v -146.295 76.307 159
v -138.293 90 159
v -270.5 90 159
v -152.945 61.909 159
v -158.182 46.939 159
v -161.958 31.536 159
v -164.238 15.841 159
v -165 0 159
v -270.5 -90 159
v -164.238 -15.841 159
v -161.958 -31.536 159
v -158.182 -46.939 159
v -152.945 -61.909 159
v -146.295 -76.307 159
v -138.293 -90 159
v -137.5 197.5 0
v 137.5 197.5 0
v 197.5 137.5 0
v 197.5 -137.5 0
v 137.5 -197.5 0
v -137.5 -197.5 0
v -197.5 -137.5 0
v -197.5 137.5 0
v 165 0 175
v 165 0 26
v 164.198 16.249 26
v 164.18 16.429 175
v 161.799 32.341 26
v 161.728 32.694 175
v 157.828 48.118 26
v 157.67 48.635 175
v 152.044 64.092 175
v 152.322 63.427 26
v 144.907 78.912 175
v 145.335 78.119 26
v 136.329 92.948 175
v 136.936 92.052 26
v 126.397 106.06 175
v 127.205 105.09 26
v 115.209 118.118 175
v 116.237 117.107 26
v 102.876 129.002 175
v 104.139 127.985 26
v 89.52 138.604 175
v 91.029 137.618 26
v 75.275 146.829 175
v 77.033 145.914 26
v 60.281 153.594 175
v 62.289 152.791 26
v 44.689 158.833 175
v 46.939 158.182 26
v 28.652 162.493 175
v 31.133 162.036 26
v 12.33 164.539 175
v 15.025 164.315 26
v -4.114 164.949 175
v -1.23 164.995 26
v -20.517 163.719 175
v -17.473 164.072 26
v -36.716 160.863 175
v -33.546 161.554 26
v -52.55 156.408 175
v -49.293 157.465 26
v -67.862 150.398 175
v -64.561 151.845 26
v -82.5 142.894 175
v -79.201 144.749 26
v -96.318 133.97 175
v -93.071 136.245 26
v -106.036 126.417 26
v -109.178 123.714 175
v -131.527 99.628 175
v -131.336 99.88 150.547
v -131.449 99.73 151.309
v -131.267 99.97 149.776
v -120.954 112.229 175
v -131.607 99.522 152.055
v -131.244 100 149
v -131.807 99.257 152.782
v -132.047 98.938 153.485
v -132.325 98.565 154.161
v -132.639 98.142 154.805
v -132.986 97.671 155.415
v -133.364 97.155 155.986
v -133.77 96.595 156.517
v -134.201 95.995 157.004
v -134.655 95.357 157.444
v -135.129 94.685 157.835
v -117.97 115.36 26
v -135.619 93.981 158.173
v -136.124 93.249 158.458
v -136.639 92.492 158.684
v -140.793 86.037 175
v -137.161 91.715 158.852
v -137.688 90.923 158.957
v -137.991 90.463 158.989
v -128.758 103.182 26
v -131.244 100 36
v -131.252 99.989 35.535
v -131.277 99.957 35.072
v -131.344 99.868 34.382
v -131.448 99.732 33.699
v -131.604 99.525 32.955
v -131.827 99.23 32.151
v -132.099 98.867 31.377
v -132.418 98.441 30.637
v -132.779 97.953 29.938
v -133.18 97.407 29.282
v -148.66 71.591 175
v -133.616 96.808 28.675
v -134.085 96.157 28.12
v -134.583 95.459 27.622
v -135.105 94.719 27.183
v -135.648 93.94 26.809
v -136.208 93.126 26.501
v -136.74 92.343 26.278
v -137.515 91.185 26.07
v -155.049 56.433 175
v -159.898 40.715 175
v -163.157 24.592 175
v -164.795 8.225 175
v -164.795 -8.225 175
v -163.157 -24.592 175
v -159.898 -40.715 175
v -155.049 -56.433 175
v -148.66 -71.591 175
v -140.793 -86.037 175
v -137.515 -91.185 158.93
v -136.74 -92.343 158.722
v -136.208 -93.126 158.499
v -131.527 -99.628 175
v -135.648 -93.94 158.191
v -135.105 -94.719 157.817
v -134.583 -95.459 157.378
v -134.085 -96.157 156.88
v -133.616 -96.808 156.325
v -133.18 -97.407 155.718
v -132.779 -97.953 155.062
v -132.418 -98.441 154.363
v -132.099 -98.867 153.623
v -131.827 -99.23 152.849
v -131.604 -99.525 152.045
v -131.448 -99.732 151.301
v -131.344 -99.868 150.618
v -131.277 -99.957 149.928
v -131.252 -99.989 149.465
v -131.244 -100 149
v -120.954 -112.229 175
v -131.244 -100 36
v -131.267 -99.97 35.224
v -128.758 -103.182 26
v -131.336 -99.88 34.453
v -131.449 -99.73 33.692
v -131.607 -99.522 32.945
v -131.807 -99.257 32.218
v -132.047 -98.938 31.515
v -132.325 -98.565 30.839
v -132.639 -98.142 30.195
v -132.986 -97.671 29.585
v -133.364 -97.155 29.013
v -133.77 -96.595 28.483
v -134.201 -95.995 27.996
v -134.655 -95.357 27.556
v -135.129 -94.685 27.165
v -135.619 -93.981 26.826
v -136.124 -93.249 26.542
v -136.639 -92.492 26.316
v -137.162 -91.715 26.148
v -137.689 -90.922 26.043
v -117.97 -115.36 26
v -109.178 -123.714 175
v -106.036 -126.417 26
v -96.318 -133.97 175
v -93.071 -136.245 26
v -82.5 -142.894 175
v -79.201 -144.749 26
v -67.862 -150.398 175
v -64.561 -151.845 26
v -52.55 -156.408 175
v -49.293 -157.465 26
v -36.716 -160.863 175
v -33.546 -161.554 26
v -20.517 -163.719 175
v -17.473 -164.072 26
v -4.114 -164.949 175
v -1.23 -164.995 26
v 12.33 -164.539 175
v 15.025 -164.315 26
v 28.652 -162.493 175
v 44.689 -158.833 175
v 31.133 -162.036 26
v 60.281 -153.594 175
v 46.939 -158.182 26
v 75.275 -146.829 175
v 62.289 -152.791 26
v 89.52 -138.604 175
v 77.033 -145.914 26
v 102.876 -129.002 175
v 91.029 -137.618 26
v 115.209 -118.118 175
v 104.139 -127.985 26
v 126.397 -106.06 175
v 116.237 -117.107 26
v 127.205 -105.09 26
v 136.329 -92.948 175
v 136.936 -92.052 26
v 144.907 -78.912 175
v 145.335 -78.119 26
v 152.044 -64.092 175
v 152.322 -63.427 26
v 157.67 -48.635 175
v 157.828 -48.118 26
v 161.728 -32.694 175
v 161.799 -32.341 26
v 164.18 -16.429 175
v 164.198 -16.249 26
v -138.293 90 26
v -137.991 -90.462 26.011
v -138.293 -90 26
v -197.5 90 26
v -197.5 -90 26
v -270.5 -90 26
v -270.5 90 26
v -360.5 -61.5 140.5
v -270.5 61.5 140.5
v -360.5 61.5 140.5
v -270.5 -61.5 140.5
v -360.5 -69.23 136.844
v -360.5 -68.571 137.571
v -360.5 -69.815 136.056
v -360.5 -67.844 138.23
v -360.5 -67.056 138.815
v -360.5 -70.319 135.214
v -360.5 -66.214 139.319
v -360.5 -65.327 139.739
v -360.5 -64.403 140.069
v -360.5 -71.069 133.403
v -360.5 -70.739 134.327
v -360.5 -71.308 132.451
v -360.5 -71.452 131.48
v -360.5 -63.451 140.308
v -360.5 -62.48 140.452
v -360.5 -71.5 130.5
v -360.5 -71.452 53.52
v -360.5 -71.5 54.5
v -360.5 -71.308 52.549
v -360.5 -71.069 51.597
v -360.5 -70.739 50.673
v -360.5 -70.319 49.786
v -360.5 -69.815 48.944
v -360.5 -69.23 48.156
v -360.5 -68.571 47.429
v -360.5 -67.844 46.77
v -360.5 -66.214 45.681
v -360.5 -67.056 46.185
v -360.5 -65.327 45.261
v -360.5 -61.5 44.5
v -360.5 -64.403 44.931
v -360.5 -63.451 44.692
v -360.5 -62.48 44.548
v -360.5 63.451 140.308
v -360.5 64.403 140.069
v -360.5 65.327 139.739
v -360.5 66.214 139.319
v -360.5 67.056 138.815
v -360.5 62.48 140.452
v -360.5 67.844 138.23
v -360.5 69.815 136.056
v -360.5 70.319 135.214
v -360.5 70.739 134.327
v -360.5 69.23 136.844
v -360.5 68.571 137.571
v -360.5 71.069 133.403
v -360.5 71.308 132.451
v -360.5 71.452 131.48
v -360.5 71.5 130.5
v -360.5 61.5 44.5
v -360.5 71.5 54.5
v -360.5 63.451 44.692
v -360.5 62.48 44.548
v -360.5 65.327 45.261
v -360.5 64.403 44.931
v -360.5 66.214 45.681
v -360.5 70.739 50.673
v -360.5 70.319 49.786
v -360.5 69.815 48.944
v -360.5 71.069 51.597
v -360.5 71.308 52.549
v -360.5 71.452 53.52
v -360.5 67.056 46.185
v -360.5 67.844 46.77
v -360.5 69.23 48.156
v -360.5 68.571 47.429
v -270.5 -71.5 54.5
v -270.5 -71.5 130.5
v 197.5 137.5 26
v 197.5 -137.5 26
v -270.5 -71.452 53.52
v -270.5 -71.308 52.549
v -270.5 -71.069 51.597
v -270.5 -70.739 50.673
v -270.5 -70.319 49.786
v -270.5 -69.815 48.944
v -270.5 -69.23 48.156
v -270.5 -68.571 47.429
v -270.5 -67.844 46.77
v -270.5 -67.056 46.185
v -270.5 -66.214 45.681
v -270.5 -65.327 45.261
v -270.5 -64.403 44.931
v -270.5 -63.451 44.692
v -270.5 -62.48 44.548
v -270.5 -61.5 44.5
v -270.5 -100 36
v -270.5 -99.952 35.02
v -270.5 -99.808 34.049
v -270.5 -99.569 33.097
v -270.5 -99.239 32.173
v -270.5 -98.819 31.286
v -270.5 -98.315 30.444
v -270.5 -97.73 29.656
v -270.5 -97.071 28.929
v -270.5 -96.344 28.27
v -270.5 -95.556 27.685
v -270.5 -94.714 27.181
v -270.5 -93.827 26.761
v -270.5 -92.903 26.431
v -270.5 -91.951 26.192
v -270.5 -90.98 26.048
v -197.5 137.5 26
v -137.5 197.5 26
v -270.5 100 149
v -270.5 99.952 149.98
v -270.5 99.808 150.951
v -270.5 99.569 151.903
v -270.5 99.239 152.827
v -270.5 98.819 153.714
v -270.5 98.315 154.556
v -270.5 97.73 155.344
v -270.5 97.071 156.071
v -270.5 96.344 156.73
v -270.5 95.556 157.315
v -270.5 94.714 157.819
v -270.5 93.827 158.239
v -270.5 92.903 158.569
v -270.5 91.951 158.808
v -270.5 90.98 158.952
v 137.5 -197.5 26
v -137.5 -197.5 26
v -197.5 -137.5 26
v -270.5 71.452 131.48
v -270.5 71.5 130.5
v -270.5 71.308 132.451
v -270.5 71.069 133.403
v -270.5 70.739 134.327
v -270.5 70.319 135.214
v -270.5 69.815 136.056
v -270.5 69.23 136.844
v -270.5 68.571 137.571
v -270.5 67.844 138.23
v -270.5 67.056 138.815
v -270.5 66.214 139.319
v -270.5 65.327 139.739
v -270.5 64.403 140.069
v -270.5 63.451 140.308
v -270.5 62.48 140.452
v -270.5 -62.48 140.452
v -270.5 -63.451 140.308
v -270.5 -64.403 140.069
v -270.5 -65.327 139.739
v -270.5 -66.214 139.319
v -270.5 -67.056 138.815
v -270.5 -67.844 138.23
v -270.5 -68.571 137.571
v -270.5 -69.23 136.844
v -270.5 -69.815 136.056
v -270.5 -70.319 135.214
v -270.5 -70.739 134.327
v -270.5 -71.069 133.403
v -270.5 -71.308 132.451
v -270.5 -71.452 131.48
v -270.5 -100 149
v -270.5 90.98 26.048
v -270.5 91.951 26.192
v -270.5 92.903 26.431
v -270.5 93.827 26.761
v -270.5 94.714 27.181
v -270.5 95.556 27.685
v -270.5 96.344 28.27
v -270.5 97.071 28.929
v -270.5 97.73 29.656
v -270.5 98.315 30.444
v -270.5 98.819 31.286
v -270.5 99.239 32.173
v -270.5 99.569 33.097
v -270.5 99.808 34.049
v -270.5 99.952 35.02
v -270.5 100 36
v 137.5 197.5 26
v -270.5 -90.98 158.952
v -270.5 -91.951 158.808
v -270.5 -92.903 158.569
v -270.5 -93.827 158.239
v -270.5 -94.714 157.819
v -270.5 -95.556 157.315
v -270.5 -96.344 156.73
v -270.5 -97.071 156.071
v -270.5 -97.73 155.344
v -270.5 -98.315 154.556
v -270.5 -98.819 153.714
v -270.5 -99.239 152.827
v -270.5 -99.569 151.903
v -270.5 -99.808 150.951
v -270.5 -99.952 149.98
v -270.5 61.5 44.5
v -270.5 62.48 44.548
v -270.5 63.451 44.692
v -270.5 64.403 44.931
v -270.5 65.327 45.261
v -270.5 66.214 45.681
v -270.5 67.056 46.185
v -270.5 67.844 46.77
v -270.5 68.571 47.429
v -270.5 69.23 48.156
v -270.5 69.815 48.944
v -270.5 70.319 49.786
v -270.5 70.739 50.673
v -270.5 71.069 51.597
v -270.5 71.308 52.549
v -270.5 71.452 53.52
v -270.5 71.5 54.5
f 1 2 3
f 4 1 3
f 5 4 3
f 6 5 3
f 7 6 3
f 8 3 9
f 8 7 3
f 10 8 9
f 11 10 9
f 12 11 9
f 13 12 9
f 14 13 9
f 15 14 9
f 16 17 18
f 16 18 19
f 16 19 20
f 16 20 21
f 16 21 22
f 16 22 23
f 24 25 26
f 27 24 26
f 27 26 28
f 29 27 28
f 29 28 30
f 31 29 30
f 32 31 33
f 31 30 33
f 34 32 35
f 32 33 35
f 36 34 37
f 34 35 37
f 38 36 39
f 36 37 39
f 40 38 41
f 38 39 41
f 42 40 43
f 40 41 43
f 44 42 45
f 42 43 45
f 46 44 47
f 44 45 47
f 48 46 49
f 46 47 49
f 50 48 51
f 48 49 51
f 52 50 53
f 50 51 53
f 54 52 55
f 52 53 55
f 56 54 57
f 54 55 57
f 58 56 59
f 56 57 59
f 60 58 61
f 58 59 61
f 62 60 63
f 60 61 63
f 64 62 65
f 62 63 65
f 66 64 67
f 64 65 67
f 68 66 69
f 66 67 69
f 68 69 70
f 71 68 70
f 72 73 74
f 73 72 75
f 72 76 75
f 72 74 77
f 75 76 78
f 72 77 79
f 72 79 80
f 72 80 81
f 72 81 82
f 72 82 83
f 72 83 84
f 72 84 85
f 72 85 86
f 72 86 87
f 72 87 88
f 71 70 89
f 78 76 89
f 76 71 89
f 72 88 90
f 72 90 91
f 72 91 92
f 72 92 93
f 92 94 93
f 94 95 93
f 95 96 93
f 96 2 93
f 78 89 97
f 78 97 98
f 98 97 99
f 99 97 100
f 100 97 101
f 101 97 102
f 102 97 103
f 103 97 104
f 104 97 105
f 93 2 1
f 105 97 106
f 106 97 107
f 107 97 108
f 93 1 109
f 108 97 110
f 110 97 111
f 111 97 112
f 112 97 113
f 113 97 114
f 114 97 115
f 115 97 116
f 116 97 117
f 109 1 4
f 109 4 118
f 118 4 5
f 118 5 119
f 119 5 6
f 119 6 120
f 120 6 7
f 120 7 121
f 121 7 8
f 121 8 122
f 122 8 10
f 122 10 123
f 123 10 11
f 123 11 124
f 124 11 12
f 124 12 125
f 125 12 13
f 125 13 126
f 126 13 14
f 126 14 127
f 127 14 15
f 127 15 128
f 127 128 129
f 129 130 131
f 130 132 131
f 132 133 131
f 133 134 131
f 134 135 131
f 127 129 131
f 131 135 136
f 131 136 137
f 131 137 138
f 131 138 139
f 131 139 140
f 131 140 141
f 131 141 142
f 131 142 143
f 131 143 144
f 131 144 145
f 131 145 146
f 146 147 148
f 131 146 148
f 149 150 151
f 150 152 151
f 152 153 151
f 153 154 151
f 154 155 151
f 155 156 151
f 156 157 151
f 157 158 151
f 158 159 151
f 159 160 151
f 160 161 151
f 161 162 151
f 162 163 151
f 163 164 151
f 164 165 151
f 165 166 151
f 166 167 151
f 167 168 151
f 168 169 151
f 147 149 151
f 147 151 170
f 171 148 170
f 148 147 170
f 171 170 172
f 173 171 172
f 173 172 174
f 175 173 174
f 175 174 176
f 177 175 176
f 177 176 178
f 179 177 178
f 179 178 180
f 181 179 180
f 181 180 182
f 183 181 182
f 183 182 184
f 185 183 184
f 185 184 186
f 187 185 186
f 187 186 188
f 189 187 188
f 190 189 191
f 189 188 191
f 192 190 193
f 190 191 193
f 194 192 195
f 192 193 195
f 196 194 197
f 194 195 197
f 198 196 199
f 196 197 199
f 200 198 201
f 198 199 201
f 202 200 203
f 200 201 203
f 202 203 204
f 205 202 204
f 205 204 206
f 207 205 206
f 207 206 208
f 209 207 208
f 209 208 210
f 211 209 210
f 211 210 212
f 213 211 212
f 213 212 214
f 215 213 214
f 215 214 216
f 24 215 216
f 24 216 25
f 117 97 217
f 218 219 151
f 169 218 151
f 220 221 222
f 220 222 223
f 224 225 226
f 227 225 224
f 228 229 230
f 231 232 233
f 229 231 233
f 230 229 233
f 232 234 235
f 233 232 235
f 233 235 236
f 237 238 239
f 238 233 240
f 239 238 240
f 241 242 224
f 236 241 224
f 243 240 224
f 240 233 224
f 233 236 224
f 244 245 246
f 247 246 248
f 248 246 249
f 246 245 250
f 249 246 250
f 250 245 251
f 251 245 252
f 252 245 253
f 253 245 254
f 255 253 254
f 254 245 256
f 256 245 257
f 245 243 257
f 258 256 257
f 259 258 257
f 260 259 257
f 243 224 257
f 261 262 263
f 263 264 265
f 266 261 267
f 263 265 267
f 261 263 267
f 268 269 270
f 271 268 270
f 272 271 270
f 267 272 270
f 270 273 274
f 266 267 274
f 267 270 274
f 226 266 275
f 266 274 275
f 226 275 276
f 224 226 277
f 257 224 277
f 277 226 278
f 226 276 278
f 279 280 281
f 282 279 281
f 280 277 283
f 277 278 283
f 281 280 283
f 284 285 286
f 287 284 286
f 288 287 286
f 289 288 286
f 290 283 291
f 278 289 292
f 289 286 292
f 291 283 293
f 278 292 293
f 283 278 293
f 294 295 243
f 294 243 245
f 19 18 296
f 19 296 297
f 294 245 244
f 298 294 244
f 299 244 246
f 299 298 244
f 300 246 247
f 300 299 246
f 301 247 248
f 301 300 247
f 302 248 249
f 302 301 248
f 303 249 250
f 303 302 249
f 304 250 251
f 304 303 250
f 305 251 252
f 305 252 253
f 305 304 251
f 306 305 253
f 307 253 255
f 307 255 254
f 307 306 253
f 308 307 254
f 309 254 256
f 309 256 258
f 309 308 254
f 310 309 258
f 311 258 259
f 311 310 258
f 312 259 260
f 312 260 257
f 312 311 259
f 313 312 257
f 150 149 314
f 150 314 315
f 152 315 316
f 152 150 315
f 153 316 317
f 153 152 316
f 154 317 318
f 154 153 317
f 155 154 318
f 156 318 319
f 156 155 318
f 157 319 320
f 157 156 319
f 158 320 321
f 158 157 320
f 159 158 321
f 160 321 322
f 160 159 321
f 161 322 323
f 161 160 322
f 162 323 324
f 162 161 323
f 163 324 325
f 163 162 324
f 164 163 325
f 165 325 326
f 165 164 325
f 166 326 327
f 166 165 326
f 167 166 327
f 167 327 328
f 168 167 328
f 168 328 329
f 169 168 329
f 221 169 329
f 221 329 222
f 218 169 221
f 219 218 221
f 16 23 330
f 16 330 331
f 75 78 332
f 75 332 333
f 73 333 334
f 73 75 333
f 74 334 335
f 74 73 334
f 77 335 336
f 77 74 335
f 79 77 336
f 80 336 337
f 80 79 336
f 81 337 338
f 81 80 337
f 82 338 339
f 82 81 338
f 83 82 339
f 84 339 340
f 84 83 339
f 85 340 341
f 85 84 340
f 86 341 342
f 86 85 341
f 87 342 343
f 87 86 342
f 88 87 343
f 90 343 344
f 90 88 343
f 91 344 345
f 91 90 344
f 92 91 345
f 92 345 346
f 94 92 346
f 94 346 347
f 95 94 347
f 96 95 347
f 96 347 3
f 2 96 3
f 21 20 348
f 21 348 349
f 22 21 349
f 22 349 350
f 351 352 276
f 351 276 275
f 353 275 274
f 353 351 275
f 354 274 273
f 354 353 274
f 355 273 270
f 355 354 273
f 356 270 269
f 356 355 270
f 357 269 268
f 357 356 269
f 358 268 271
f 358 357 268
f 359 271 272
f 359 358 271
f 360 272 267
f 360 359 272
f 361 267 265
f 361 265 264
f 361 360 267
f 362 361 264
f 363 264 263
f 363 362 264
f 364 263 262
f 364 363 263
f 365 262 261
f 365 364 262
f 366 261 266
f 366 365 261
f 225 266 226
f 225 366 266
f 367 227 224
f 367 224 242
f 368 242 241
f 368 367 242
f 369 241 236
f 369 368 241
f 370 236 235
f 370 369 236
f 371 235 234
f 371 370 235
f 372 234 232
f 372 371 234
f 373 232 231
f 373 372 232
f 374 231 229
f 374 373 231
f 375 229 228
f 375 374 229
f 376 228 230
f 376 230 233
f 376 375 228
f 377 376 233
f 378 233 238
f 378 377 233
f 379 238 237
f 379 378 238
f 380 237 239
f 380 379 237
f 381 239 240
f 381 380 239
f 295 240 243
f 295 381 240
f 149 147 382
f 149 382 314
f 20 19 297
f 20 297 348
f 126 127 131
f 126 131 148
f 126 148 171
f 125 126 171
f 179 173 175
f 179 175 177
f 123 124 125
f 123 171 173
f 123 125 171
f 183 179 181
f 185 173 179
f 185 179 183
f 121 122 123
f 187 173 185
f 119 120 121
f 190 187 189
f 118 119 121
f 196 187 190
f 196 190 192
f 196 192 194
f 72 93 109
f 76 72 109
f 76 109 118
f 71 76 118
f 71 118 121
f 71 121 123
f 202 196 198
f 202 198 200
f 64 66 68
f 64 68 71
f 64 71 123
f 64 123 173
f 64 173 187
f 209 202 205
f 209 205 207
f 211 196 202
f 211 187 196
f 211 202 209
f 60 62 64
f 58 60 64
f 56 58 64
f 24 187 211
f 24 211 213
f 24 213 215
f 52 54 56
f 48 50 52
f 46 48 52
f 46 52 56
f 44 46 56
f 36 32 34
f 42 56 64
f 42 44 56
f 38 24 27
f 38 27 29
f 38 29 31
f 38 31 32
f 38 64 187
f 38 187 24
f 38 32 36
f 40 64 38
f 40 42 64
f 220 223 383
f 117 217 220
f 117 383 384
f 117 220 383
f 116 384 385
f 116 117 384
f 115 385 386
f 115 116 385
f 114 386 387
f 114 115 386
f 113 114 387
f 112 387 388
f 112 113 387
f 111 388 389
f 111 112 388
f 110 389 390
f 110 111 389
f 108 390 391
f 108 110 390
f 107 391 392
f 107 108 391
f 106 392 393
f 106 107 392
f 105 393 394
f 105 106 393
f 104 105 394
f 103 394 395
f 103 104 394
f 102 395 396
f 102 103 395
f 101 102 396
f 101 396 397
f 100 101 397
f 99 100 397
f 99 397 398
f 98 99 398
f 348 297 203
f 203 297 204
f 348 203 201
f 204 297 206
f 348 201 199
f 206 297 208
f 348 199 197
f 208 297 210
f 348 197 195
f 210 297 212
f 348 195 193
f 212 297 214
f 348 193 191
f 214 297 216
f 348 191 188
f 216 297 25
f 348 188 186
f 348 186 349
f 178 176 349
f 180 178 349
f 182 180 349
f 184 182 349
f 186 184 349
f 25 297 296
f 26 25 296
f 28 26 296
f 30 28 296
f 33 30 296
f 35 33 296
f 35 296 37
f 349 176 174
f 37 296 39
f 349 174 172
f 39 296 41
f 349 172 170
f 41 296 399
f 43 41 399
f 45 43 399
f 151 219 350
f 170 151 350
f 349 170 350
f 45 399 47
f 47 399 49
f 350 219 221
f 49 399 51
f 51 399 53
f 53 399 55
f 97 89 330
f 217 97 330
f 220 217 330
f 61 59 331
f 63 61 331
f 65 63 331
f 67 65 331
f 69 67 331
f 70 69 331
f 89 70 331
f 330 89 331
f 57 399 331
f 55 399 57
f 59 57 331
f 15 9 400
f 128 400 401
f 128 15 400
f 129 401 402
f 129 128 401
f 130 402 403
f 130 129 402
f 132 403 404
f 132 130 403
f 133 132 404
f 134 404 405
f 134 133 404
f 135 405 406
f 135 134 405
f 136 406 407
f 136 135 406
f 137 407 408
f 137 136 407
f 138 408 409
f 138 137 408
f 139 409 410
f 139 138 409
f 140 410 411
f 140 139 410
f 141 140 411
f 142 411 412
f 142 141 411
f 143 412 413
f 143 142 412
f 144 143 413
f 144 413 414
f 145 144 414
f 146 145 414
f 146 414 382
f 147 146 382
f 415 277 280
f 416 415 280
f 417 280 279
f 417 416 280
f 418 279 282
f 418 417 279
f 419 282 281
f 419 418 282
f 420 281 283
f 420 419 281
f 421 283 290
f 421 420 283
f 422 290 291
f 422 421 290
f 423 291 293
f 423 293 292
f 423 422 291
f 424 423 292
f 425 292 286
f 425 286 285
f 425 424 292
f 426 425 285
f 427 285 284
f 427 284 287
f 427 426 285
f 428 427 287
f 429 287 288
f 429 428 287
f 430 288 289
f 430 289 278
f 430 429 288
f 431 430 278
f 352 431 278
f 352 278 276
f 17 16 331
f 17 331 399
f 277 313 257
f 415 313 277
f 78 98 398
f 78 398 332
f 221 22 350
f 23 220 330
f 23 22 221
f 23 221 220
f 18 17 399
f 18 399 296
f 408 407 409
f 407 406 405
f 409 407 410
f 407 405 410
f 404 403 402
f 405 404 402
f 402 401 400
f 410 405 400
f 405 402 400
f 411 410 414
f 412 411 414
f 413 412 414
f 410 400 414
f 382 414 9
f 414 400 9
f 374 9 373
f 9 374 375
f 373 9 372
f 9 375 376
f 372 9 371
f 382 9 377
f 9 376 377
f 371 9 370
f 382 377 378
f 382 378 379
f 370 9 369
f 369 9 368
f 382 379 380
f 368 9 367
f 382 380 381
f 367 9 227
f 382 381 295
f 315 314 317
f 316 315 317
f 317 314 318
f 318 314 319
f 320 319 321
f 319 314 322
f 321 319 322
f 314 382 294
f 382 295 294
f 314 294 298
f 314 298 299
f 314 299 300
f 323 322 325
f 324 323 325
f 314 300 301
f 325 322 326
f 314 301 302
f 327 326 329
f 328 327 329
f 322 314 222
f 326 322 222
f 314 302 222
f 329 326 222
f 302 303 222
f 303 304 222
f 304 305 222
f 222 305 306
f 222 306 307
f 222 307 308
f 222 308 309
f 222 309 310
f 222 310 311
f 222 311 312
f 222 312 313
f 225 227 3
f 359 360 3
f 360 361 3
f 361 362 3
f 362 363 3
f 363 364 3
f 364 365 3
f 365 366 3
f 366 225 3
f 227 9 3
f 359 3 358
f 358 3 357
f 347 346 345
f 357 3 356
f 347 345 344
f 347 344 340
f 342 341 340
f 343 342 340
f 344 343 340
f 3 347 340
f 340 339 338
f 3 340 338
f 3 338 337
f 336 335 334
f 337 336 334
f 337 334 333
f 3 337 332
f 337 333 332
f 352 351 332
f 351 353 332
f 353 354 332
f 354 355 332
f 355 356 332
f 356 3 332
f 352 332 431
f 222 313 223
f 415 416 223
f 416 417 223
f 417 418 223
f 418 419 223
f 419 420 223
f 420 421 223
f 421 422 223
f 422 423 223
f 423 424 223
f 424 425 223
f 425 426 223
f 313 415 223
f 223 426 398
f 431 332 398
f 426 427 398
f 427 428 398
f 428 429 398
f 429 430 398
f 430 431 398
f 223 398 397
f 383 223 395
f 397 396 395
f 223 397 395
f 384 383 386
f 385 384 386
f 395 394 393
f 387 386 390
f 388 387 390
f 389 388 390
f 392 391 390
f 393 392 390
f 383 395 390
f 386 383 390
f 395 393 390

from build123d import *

# Parameters (mm, degrees)
EXTRUDE_1_DEPTH = 26
SKETCH_3_R      = 165
EXTRUDE_2_DEPTH = 149
EXTRUDE_3_DEPTH = 270.5
EXTRUDE_4_DEPTH = 90


with BuildPart() as part:
    # 草圖1 → 填料-伸長1 (new body)
    with BuildSketch(Plane.XY):
        Polygon((-197.5, 137.5), (-137.5, 197.5), (137.5, 197.5), (197.5, 137.5), (197.5, -137.5), (137.5, -197.5), (-137.5, -197.5), (-197.5, -137.5), align=None)
    extrude(amount=EXTRUDE_1_DEPTH)

    # 草圖3 → 填料-伸長2 (add)
    with BuildSketch(Plane.XY.offset(26)):
        Circle(SKETCH_3_R)
    extrude(amount=EXTRUDE_2_DEPTH)

    # 草圖4 → 填料-伸長3 (add)
    with BuildSketch(Plane(origin=(0, 0, 0), x_dir=(0, 0, -1), z_dir=(1, 0, 0))):
        with BuildLine():
            Line((-36, 100), (-149, 100))
            ThreePointArc((-149, 100), (-156.071067812, 97.071067812), (-159, 90))
            Line((-159, 90), (-159, -90))
            ThreePointArc((-159, -90), (-156.071067812, -97.071067812), (-149, -100))
            Line((-149, -100), (-36, -100))
            ThreePointArc((-36, -100), (-28.928932188, -97.071067812), (-26, -90))
            Line((-26, -90), (-26, 90))
            ThreePointArc((-26, 90), (-28.928932188, 97.071067812), (-36, 100))
        make_face()
    extrude(amount=-EXTRUDE_3_DEPTH)

    # 草圖5 → 填料-伸長4 (add)
    with BuildSketch(Plane.ZY.offset(270.5)):
        with BuildLine():
            Line((54.5, 71.5), (130.5, 71.5))
            ThreePointArc((130.5, 71.5), (137.571067812, 68.571067812), (140.5, 61.5))
            Line((140.5, 61.5), (140.5, -61.5))
            ThreePointArc((140.5, -61.5), (137.571067812, -68.571067812), (130.5, -71.5))
            Line((130.5, -71.5), (54.5, -71.5))
            ThreePointArc((54.5, -71.5), (47.428932188, -68.571067812), (44.5, -61.5))
            Line((44.5, -61.5), (44.5, 61.5))
            ThreePointArc((44.5, 61.5), (47.428932188, 68.571067812), (54.5, 71.5))
        make_face()
    extrude(amount=EXTRUDE_4_DEPTH)


solid = part.part
